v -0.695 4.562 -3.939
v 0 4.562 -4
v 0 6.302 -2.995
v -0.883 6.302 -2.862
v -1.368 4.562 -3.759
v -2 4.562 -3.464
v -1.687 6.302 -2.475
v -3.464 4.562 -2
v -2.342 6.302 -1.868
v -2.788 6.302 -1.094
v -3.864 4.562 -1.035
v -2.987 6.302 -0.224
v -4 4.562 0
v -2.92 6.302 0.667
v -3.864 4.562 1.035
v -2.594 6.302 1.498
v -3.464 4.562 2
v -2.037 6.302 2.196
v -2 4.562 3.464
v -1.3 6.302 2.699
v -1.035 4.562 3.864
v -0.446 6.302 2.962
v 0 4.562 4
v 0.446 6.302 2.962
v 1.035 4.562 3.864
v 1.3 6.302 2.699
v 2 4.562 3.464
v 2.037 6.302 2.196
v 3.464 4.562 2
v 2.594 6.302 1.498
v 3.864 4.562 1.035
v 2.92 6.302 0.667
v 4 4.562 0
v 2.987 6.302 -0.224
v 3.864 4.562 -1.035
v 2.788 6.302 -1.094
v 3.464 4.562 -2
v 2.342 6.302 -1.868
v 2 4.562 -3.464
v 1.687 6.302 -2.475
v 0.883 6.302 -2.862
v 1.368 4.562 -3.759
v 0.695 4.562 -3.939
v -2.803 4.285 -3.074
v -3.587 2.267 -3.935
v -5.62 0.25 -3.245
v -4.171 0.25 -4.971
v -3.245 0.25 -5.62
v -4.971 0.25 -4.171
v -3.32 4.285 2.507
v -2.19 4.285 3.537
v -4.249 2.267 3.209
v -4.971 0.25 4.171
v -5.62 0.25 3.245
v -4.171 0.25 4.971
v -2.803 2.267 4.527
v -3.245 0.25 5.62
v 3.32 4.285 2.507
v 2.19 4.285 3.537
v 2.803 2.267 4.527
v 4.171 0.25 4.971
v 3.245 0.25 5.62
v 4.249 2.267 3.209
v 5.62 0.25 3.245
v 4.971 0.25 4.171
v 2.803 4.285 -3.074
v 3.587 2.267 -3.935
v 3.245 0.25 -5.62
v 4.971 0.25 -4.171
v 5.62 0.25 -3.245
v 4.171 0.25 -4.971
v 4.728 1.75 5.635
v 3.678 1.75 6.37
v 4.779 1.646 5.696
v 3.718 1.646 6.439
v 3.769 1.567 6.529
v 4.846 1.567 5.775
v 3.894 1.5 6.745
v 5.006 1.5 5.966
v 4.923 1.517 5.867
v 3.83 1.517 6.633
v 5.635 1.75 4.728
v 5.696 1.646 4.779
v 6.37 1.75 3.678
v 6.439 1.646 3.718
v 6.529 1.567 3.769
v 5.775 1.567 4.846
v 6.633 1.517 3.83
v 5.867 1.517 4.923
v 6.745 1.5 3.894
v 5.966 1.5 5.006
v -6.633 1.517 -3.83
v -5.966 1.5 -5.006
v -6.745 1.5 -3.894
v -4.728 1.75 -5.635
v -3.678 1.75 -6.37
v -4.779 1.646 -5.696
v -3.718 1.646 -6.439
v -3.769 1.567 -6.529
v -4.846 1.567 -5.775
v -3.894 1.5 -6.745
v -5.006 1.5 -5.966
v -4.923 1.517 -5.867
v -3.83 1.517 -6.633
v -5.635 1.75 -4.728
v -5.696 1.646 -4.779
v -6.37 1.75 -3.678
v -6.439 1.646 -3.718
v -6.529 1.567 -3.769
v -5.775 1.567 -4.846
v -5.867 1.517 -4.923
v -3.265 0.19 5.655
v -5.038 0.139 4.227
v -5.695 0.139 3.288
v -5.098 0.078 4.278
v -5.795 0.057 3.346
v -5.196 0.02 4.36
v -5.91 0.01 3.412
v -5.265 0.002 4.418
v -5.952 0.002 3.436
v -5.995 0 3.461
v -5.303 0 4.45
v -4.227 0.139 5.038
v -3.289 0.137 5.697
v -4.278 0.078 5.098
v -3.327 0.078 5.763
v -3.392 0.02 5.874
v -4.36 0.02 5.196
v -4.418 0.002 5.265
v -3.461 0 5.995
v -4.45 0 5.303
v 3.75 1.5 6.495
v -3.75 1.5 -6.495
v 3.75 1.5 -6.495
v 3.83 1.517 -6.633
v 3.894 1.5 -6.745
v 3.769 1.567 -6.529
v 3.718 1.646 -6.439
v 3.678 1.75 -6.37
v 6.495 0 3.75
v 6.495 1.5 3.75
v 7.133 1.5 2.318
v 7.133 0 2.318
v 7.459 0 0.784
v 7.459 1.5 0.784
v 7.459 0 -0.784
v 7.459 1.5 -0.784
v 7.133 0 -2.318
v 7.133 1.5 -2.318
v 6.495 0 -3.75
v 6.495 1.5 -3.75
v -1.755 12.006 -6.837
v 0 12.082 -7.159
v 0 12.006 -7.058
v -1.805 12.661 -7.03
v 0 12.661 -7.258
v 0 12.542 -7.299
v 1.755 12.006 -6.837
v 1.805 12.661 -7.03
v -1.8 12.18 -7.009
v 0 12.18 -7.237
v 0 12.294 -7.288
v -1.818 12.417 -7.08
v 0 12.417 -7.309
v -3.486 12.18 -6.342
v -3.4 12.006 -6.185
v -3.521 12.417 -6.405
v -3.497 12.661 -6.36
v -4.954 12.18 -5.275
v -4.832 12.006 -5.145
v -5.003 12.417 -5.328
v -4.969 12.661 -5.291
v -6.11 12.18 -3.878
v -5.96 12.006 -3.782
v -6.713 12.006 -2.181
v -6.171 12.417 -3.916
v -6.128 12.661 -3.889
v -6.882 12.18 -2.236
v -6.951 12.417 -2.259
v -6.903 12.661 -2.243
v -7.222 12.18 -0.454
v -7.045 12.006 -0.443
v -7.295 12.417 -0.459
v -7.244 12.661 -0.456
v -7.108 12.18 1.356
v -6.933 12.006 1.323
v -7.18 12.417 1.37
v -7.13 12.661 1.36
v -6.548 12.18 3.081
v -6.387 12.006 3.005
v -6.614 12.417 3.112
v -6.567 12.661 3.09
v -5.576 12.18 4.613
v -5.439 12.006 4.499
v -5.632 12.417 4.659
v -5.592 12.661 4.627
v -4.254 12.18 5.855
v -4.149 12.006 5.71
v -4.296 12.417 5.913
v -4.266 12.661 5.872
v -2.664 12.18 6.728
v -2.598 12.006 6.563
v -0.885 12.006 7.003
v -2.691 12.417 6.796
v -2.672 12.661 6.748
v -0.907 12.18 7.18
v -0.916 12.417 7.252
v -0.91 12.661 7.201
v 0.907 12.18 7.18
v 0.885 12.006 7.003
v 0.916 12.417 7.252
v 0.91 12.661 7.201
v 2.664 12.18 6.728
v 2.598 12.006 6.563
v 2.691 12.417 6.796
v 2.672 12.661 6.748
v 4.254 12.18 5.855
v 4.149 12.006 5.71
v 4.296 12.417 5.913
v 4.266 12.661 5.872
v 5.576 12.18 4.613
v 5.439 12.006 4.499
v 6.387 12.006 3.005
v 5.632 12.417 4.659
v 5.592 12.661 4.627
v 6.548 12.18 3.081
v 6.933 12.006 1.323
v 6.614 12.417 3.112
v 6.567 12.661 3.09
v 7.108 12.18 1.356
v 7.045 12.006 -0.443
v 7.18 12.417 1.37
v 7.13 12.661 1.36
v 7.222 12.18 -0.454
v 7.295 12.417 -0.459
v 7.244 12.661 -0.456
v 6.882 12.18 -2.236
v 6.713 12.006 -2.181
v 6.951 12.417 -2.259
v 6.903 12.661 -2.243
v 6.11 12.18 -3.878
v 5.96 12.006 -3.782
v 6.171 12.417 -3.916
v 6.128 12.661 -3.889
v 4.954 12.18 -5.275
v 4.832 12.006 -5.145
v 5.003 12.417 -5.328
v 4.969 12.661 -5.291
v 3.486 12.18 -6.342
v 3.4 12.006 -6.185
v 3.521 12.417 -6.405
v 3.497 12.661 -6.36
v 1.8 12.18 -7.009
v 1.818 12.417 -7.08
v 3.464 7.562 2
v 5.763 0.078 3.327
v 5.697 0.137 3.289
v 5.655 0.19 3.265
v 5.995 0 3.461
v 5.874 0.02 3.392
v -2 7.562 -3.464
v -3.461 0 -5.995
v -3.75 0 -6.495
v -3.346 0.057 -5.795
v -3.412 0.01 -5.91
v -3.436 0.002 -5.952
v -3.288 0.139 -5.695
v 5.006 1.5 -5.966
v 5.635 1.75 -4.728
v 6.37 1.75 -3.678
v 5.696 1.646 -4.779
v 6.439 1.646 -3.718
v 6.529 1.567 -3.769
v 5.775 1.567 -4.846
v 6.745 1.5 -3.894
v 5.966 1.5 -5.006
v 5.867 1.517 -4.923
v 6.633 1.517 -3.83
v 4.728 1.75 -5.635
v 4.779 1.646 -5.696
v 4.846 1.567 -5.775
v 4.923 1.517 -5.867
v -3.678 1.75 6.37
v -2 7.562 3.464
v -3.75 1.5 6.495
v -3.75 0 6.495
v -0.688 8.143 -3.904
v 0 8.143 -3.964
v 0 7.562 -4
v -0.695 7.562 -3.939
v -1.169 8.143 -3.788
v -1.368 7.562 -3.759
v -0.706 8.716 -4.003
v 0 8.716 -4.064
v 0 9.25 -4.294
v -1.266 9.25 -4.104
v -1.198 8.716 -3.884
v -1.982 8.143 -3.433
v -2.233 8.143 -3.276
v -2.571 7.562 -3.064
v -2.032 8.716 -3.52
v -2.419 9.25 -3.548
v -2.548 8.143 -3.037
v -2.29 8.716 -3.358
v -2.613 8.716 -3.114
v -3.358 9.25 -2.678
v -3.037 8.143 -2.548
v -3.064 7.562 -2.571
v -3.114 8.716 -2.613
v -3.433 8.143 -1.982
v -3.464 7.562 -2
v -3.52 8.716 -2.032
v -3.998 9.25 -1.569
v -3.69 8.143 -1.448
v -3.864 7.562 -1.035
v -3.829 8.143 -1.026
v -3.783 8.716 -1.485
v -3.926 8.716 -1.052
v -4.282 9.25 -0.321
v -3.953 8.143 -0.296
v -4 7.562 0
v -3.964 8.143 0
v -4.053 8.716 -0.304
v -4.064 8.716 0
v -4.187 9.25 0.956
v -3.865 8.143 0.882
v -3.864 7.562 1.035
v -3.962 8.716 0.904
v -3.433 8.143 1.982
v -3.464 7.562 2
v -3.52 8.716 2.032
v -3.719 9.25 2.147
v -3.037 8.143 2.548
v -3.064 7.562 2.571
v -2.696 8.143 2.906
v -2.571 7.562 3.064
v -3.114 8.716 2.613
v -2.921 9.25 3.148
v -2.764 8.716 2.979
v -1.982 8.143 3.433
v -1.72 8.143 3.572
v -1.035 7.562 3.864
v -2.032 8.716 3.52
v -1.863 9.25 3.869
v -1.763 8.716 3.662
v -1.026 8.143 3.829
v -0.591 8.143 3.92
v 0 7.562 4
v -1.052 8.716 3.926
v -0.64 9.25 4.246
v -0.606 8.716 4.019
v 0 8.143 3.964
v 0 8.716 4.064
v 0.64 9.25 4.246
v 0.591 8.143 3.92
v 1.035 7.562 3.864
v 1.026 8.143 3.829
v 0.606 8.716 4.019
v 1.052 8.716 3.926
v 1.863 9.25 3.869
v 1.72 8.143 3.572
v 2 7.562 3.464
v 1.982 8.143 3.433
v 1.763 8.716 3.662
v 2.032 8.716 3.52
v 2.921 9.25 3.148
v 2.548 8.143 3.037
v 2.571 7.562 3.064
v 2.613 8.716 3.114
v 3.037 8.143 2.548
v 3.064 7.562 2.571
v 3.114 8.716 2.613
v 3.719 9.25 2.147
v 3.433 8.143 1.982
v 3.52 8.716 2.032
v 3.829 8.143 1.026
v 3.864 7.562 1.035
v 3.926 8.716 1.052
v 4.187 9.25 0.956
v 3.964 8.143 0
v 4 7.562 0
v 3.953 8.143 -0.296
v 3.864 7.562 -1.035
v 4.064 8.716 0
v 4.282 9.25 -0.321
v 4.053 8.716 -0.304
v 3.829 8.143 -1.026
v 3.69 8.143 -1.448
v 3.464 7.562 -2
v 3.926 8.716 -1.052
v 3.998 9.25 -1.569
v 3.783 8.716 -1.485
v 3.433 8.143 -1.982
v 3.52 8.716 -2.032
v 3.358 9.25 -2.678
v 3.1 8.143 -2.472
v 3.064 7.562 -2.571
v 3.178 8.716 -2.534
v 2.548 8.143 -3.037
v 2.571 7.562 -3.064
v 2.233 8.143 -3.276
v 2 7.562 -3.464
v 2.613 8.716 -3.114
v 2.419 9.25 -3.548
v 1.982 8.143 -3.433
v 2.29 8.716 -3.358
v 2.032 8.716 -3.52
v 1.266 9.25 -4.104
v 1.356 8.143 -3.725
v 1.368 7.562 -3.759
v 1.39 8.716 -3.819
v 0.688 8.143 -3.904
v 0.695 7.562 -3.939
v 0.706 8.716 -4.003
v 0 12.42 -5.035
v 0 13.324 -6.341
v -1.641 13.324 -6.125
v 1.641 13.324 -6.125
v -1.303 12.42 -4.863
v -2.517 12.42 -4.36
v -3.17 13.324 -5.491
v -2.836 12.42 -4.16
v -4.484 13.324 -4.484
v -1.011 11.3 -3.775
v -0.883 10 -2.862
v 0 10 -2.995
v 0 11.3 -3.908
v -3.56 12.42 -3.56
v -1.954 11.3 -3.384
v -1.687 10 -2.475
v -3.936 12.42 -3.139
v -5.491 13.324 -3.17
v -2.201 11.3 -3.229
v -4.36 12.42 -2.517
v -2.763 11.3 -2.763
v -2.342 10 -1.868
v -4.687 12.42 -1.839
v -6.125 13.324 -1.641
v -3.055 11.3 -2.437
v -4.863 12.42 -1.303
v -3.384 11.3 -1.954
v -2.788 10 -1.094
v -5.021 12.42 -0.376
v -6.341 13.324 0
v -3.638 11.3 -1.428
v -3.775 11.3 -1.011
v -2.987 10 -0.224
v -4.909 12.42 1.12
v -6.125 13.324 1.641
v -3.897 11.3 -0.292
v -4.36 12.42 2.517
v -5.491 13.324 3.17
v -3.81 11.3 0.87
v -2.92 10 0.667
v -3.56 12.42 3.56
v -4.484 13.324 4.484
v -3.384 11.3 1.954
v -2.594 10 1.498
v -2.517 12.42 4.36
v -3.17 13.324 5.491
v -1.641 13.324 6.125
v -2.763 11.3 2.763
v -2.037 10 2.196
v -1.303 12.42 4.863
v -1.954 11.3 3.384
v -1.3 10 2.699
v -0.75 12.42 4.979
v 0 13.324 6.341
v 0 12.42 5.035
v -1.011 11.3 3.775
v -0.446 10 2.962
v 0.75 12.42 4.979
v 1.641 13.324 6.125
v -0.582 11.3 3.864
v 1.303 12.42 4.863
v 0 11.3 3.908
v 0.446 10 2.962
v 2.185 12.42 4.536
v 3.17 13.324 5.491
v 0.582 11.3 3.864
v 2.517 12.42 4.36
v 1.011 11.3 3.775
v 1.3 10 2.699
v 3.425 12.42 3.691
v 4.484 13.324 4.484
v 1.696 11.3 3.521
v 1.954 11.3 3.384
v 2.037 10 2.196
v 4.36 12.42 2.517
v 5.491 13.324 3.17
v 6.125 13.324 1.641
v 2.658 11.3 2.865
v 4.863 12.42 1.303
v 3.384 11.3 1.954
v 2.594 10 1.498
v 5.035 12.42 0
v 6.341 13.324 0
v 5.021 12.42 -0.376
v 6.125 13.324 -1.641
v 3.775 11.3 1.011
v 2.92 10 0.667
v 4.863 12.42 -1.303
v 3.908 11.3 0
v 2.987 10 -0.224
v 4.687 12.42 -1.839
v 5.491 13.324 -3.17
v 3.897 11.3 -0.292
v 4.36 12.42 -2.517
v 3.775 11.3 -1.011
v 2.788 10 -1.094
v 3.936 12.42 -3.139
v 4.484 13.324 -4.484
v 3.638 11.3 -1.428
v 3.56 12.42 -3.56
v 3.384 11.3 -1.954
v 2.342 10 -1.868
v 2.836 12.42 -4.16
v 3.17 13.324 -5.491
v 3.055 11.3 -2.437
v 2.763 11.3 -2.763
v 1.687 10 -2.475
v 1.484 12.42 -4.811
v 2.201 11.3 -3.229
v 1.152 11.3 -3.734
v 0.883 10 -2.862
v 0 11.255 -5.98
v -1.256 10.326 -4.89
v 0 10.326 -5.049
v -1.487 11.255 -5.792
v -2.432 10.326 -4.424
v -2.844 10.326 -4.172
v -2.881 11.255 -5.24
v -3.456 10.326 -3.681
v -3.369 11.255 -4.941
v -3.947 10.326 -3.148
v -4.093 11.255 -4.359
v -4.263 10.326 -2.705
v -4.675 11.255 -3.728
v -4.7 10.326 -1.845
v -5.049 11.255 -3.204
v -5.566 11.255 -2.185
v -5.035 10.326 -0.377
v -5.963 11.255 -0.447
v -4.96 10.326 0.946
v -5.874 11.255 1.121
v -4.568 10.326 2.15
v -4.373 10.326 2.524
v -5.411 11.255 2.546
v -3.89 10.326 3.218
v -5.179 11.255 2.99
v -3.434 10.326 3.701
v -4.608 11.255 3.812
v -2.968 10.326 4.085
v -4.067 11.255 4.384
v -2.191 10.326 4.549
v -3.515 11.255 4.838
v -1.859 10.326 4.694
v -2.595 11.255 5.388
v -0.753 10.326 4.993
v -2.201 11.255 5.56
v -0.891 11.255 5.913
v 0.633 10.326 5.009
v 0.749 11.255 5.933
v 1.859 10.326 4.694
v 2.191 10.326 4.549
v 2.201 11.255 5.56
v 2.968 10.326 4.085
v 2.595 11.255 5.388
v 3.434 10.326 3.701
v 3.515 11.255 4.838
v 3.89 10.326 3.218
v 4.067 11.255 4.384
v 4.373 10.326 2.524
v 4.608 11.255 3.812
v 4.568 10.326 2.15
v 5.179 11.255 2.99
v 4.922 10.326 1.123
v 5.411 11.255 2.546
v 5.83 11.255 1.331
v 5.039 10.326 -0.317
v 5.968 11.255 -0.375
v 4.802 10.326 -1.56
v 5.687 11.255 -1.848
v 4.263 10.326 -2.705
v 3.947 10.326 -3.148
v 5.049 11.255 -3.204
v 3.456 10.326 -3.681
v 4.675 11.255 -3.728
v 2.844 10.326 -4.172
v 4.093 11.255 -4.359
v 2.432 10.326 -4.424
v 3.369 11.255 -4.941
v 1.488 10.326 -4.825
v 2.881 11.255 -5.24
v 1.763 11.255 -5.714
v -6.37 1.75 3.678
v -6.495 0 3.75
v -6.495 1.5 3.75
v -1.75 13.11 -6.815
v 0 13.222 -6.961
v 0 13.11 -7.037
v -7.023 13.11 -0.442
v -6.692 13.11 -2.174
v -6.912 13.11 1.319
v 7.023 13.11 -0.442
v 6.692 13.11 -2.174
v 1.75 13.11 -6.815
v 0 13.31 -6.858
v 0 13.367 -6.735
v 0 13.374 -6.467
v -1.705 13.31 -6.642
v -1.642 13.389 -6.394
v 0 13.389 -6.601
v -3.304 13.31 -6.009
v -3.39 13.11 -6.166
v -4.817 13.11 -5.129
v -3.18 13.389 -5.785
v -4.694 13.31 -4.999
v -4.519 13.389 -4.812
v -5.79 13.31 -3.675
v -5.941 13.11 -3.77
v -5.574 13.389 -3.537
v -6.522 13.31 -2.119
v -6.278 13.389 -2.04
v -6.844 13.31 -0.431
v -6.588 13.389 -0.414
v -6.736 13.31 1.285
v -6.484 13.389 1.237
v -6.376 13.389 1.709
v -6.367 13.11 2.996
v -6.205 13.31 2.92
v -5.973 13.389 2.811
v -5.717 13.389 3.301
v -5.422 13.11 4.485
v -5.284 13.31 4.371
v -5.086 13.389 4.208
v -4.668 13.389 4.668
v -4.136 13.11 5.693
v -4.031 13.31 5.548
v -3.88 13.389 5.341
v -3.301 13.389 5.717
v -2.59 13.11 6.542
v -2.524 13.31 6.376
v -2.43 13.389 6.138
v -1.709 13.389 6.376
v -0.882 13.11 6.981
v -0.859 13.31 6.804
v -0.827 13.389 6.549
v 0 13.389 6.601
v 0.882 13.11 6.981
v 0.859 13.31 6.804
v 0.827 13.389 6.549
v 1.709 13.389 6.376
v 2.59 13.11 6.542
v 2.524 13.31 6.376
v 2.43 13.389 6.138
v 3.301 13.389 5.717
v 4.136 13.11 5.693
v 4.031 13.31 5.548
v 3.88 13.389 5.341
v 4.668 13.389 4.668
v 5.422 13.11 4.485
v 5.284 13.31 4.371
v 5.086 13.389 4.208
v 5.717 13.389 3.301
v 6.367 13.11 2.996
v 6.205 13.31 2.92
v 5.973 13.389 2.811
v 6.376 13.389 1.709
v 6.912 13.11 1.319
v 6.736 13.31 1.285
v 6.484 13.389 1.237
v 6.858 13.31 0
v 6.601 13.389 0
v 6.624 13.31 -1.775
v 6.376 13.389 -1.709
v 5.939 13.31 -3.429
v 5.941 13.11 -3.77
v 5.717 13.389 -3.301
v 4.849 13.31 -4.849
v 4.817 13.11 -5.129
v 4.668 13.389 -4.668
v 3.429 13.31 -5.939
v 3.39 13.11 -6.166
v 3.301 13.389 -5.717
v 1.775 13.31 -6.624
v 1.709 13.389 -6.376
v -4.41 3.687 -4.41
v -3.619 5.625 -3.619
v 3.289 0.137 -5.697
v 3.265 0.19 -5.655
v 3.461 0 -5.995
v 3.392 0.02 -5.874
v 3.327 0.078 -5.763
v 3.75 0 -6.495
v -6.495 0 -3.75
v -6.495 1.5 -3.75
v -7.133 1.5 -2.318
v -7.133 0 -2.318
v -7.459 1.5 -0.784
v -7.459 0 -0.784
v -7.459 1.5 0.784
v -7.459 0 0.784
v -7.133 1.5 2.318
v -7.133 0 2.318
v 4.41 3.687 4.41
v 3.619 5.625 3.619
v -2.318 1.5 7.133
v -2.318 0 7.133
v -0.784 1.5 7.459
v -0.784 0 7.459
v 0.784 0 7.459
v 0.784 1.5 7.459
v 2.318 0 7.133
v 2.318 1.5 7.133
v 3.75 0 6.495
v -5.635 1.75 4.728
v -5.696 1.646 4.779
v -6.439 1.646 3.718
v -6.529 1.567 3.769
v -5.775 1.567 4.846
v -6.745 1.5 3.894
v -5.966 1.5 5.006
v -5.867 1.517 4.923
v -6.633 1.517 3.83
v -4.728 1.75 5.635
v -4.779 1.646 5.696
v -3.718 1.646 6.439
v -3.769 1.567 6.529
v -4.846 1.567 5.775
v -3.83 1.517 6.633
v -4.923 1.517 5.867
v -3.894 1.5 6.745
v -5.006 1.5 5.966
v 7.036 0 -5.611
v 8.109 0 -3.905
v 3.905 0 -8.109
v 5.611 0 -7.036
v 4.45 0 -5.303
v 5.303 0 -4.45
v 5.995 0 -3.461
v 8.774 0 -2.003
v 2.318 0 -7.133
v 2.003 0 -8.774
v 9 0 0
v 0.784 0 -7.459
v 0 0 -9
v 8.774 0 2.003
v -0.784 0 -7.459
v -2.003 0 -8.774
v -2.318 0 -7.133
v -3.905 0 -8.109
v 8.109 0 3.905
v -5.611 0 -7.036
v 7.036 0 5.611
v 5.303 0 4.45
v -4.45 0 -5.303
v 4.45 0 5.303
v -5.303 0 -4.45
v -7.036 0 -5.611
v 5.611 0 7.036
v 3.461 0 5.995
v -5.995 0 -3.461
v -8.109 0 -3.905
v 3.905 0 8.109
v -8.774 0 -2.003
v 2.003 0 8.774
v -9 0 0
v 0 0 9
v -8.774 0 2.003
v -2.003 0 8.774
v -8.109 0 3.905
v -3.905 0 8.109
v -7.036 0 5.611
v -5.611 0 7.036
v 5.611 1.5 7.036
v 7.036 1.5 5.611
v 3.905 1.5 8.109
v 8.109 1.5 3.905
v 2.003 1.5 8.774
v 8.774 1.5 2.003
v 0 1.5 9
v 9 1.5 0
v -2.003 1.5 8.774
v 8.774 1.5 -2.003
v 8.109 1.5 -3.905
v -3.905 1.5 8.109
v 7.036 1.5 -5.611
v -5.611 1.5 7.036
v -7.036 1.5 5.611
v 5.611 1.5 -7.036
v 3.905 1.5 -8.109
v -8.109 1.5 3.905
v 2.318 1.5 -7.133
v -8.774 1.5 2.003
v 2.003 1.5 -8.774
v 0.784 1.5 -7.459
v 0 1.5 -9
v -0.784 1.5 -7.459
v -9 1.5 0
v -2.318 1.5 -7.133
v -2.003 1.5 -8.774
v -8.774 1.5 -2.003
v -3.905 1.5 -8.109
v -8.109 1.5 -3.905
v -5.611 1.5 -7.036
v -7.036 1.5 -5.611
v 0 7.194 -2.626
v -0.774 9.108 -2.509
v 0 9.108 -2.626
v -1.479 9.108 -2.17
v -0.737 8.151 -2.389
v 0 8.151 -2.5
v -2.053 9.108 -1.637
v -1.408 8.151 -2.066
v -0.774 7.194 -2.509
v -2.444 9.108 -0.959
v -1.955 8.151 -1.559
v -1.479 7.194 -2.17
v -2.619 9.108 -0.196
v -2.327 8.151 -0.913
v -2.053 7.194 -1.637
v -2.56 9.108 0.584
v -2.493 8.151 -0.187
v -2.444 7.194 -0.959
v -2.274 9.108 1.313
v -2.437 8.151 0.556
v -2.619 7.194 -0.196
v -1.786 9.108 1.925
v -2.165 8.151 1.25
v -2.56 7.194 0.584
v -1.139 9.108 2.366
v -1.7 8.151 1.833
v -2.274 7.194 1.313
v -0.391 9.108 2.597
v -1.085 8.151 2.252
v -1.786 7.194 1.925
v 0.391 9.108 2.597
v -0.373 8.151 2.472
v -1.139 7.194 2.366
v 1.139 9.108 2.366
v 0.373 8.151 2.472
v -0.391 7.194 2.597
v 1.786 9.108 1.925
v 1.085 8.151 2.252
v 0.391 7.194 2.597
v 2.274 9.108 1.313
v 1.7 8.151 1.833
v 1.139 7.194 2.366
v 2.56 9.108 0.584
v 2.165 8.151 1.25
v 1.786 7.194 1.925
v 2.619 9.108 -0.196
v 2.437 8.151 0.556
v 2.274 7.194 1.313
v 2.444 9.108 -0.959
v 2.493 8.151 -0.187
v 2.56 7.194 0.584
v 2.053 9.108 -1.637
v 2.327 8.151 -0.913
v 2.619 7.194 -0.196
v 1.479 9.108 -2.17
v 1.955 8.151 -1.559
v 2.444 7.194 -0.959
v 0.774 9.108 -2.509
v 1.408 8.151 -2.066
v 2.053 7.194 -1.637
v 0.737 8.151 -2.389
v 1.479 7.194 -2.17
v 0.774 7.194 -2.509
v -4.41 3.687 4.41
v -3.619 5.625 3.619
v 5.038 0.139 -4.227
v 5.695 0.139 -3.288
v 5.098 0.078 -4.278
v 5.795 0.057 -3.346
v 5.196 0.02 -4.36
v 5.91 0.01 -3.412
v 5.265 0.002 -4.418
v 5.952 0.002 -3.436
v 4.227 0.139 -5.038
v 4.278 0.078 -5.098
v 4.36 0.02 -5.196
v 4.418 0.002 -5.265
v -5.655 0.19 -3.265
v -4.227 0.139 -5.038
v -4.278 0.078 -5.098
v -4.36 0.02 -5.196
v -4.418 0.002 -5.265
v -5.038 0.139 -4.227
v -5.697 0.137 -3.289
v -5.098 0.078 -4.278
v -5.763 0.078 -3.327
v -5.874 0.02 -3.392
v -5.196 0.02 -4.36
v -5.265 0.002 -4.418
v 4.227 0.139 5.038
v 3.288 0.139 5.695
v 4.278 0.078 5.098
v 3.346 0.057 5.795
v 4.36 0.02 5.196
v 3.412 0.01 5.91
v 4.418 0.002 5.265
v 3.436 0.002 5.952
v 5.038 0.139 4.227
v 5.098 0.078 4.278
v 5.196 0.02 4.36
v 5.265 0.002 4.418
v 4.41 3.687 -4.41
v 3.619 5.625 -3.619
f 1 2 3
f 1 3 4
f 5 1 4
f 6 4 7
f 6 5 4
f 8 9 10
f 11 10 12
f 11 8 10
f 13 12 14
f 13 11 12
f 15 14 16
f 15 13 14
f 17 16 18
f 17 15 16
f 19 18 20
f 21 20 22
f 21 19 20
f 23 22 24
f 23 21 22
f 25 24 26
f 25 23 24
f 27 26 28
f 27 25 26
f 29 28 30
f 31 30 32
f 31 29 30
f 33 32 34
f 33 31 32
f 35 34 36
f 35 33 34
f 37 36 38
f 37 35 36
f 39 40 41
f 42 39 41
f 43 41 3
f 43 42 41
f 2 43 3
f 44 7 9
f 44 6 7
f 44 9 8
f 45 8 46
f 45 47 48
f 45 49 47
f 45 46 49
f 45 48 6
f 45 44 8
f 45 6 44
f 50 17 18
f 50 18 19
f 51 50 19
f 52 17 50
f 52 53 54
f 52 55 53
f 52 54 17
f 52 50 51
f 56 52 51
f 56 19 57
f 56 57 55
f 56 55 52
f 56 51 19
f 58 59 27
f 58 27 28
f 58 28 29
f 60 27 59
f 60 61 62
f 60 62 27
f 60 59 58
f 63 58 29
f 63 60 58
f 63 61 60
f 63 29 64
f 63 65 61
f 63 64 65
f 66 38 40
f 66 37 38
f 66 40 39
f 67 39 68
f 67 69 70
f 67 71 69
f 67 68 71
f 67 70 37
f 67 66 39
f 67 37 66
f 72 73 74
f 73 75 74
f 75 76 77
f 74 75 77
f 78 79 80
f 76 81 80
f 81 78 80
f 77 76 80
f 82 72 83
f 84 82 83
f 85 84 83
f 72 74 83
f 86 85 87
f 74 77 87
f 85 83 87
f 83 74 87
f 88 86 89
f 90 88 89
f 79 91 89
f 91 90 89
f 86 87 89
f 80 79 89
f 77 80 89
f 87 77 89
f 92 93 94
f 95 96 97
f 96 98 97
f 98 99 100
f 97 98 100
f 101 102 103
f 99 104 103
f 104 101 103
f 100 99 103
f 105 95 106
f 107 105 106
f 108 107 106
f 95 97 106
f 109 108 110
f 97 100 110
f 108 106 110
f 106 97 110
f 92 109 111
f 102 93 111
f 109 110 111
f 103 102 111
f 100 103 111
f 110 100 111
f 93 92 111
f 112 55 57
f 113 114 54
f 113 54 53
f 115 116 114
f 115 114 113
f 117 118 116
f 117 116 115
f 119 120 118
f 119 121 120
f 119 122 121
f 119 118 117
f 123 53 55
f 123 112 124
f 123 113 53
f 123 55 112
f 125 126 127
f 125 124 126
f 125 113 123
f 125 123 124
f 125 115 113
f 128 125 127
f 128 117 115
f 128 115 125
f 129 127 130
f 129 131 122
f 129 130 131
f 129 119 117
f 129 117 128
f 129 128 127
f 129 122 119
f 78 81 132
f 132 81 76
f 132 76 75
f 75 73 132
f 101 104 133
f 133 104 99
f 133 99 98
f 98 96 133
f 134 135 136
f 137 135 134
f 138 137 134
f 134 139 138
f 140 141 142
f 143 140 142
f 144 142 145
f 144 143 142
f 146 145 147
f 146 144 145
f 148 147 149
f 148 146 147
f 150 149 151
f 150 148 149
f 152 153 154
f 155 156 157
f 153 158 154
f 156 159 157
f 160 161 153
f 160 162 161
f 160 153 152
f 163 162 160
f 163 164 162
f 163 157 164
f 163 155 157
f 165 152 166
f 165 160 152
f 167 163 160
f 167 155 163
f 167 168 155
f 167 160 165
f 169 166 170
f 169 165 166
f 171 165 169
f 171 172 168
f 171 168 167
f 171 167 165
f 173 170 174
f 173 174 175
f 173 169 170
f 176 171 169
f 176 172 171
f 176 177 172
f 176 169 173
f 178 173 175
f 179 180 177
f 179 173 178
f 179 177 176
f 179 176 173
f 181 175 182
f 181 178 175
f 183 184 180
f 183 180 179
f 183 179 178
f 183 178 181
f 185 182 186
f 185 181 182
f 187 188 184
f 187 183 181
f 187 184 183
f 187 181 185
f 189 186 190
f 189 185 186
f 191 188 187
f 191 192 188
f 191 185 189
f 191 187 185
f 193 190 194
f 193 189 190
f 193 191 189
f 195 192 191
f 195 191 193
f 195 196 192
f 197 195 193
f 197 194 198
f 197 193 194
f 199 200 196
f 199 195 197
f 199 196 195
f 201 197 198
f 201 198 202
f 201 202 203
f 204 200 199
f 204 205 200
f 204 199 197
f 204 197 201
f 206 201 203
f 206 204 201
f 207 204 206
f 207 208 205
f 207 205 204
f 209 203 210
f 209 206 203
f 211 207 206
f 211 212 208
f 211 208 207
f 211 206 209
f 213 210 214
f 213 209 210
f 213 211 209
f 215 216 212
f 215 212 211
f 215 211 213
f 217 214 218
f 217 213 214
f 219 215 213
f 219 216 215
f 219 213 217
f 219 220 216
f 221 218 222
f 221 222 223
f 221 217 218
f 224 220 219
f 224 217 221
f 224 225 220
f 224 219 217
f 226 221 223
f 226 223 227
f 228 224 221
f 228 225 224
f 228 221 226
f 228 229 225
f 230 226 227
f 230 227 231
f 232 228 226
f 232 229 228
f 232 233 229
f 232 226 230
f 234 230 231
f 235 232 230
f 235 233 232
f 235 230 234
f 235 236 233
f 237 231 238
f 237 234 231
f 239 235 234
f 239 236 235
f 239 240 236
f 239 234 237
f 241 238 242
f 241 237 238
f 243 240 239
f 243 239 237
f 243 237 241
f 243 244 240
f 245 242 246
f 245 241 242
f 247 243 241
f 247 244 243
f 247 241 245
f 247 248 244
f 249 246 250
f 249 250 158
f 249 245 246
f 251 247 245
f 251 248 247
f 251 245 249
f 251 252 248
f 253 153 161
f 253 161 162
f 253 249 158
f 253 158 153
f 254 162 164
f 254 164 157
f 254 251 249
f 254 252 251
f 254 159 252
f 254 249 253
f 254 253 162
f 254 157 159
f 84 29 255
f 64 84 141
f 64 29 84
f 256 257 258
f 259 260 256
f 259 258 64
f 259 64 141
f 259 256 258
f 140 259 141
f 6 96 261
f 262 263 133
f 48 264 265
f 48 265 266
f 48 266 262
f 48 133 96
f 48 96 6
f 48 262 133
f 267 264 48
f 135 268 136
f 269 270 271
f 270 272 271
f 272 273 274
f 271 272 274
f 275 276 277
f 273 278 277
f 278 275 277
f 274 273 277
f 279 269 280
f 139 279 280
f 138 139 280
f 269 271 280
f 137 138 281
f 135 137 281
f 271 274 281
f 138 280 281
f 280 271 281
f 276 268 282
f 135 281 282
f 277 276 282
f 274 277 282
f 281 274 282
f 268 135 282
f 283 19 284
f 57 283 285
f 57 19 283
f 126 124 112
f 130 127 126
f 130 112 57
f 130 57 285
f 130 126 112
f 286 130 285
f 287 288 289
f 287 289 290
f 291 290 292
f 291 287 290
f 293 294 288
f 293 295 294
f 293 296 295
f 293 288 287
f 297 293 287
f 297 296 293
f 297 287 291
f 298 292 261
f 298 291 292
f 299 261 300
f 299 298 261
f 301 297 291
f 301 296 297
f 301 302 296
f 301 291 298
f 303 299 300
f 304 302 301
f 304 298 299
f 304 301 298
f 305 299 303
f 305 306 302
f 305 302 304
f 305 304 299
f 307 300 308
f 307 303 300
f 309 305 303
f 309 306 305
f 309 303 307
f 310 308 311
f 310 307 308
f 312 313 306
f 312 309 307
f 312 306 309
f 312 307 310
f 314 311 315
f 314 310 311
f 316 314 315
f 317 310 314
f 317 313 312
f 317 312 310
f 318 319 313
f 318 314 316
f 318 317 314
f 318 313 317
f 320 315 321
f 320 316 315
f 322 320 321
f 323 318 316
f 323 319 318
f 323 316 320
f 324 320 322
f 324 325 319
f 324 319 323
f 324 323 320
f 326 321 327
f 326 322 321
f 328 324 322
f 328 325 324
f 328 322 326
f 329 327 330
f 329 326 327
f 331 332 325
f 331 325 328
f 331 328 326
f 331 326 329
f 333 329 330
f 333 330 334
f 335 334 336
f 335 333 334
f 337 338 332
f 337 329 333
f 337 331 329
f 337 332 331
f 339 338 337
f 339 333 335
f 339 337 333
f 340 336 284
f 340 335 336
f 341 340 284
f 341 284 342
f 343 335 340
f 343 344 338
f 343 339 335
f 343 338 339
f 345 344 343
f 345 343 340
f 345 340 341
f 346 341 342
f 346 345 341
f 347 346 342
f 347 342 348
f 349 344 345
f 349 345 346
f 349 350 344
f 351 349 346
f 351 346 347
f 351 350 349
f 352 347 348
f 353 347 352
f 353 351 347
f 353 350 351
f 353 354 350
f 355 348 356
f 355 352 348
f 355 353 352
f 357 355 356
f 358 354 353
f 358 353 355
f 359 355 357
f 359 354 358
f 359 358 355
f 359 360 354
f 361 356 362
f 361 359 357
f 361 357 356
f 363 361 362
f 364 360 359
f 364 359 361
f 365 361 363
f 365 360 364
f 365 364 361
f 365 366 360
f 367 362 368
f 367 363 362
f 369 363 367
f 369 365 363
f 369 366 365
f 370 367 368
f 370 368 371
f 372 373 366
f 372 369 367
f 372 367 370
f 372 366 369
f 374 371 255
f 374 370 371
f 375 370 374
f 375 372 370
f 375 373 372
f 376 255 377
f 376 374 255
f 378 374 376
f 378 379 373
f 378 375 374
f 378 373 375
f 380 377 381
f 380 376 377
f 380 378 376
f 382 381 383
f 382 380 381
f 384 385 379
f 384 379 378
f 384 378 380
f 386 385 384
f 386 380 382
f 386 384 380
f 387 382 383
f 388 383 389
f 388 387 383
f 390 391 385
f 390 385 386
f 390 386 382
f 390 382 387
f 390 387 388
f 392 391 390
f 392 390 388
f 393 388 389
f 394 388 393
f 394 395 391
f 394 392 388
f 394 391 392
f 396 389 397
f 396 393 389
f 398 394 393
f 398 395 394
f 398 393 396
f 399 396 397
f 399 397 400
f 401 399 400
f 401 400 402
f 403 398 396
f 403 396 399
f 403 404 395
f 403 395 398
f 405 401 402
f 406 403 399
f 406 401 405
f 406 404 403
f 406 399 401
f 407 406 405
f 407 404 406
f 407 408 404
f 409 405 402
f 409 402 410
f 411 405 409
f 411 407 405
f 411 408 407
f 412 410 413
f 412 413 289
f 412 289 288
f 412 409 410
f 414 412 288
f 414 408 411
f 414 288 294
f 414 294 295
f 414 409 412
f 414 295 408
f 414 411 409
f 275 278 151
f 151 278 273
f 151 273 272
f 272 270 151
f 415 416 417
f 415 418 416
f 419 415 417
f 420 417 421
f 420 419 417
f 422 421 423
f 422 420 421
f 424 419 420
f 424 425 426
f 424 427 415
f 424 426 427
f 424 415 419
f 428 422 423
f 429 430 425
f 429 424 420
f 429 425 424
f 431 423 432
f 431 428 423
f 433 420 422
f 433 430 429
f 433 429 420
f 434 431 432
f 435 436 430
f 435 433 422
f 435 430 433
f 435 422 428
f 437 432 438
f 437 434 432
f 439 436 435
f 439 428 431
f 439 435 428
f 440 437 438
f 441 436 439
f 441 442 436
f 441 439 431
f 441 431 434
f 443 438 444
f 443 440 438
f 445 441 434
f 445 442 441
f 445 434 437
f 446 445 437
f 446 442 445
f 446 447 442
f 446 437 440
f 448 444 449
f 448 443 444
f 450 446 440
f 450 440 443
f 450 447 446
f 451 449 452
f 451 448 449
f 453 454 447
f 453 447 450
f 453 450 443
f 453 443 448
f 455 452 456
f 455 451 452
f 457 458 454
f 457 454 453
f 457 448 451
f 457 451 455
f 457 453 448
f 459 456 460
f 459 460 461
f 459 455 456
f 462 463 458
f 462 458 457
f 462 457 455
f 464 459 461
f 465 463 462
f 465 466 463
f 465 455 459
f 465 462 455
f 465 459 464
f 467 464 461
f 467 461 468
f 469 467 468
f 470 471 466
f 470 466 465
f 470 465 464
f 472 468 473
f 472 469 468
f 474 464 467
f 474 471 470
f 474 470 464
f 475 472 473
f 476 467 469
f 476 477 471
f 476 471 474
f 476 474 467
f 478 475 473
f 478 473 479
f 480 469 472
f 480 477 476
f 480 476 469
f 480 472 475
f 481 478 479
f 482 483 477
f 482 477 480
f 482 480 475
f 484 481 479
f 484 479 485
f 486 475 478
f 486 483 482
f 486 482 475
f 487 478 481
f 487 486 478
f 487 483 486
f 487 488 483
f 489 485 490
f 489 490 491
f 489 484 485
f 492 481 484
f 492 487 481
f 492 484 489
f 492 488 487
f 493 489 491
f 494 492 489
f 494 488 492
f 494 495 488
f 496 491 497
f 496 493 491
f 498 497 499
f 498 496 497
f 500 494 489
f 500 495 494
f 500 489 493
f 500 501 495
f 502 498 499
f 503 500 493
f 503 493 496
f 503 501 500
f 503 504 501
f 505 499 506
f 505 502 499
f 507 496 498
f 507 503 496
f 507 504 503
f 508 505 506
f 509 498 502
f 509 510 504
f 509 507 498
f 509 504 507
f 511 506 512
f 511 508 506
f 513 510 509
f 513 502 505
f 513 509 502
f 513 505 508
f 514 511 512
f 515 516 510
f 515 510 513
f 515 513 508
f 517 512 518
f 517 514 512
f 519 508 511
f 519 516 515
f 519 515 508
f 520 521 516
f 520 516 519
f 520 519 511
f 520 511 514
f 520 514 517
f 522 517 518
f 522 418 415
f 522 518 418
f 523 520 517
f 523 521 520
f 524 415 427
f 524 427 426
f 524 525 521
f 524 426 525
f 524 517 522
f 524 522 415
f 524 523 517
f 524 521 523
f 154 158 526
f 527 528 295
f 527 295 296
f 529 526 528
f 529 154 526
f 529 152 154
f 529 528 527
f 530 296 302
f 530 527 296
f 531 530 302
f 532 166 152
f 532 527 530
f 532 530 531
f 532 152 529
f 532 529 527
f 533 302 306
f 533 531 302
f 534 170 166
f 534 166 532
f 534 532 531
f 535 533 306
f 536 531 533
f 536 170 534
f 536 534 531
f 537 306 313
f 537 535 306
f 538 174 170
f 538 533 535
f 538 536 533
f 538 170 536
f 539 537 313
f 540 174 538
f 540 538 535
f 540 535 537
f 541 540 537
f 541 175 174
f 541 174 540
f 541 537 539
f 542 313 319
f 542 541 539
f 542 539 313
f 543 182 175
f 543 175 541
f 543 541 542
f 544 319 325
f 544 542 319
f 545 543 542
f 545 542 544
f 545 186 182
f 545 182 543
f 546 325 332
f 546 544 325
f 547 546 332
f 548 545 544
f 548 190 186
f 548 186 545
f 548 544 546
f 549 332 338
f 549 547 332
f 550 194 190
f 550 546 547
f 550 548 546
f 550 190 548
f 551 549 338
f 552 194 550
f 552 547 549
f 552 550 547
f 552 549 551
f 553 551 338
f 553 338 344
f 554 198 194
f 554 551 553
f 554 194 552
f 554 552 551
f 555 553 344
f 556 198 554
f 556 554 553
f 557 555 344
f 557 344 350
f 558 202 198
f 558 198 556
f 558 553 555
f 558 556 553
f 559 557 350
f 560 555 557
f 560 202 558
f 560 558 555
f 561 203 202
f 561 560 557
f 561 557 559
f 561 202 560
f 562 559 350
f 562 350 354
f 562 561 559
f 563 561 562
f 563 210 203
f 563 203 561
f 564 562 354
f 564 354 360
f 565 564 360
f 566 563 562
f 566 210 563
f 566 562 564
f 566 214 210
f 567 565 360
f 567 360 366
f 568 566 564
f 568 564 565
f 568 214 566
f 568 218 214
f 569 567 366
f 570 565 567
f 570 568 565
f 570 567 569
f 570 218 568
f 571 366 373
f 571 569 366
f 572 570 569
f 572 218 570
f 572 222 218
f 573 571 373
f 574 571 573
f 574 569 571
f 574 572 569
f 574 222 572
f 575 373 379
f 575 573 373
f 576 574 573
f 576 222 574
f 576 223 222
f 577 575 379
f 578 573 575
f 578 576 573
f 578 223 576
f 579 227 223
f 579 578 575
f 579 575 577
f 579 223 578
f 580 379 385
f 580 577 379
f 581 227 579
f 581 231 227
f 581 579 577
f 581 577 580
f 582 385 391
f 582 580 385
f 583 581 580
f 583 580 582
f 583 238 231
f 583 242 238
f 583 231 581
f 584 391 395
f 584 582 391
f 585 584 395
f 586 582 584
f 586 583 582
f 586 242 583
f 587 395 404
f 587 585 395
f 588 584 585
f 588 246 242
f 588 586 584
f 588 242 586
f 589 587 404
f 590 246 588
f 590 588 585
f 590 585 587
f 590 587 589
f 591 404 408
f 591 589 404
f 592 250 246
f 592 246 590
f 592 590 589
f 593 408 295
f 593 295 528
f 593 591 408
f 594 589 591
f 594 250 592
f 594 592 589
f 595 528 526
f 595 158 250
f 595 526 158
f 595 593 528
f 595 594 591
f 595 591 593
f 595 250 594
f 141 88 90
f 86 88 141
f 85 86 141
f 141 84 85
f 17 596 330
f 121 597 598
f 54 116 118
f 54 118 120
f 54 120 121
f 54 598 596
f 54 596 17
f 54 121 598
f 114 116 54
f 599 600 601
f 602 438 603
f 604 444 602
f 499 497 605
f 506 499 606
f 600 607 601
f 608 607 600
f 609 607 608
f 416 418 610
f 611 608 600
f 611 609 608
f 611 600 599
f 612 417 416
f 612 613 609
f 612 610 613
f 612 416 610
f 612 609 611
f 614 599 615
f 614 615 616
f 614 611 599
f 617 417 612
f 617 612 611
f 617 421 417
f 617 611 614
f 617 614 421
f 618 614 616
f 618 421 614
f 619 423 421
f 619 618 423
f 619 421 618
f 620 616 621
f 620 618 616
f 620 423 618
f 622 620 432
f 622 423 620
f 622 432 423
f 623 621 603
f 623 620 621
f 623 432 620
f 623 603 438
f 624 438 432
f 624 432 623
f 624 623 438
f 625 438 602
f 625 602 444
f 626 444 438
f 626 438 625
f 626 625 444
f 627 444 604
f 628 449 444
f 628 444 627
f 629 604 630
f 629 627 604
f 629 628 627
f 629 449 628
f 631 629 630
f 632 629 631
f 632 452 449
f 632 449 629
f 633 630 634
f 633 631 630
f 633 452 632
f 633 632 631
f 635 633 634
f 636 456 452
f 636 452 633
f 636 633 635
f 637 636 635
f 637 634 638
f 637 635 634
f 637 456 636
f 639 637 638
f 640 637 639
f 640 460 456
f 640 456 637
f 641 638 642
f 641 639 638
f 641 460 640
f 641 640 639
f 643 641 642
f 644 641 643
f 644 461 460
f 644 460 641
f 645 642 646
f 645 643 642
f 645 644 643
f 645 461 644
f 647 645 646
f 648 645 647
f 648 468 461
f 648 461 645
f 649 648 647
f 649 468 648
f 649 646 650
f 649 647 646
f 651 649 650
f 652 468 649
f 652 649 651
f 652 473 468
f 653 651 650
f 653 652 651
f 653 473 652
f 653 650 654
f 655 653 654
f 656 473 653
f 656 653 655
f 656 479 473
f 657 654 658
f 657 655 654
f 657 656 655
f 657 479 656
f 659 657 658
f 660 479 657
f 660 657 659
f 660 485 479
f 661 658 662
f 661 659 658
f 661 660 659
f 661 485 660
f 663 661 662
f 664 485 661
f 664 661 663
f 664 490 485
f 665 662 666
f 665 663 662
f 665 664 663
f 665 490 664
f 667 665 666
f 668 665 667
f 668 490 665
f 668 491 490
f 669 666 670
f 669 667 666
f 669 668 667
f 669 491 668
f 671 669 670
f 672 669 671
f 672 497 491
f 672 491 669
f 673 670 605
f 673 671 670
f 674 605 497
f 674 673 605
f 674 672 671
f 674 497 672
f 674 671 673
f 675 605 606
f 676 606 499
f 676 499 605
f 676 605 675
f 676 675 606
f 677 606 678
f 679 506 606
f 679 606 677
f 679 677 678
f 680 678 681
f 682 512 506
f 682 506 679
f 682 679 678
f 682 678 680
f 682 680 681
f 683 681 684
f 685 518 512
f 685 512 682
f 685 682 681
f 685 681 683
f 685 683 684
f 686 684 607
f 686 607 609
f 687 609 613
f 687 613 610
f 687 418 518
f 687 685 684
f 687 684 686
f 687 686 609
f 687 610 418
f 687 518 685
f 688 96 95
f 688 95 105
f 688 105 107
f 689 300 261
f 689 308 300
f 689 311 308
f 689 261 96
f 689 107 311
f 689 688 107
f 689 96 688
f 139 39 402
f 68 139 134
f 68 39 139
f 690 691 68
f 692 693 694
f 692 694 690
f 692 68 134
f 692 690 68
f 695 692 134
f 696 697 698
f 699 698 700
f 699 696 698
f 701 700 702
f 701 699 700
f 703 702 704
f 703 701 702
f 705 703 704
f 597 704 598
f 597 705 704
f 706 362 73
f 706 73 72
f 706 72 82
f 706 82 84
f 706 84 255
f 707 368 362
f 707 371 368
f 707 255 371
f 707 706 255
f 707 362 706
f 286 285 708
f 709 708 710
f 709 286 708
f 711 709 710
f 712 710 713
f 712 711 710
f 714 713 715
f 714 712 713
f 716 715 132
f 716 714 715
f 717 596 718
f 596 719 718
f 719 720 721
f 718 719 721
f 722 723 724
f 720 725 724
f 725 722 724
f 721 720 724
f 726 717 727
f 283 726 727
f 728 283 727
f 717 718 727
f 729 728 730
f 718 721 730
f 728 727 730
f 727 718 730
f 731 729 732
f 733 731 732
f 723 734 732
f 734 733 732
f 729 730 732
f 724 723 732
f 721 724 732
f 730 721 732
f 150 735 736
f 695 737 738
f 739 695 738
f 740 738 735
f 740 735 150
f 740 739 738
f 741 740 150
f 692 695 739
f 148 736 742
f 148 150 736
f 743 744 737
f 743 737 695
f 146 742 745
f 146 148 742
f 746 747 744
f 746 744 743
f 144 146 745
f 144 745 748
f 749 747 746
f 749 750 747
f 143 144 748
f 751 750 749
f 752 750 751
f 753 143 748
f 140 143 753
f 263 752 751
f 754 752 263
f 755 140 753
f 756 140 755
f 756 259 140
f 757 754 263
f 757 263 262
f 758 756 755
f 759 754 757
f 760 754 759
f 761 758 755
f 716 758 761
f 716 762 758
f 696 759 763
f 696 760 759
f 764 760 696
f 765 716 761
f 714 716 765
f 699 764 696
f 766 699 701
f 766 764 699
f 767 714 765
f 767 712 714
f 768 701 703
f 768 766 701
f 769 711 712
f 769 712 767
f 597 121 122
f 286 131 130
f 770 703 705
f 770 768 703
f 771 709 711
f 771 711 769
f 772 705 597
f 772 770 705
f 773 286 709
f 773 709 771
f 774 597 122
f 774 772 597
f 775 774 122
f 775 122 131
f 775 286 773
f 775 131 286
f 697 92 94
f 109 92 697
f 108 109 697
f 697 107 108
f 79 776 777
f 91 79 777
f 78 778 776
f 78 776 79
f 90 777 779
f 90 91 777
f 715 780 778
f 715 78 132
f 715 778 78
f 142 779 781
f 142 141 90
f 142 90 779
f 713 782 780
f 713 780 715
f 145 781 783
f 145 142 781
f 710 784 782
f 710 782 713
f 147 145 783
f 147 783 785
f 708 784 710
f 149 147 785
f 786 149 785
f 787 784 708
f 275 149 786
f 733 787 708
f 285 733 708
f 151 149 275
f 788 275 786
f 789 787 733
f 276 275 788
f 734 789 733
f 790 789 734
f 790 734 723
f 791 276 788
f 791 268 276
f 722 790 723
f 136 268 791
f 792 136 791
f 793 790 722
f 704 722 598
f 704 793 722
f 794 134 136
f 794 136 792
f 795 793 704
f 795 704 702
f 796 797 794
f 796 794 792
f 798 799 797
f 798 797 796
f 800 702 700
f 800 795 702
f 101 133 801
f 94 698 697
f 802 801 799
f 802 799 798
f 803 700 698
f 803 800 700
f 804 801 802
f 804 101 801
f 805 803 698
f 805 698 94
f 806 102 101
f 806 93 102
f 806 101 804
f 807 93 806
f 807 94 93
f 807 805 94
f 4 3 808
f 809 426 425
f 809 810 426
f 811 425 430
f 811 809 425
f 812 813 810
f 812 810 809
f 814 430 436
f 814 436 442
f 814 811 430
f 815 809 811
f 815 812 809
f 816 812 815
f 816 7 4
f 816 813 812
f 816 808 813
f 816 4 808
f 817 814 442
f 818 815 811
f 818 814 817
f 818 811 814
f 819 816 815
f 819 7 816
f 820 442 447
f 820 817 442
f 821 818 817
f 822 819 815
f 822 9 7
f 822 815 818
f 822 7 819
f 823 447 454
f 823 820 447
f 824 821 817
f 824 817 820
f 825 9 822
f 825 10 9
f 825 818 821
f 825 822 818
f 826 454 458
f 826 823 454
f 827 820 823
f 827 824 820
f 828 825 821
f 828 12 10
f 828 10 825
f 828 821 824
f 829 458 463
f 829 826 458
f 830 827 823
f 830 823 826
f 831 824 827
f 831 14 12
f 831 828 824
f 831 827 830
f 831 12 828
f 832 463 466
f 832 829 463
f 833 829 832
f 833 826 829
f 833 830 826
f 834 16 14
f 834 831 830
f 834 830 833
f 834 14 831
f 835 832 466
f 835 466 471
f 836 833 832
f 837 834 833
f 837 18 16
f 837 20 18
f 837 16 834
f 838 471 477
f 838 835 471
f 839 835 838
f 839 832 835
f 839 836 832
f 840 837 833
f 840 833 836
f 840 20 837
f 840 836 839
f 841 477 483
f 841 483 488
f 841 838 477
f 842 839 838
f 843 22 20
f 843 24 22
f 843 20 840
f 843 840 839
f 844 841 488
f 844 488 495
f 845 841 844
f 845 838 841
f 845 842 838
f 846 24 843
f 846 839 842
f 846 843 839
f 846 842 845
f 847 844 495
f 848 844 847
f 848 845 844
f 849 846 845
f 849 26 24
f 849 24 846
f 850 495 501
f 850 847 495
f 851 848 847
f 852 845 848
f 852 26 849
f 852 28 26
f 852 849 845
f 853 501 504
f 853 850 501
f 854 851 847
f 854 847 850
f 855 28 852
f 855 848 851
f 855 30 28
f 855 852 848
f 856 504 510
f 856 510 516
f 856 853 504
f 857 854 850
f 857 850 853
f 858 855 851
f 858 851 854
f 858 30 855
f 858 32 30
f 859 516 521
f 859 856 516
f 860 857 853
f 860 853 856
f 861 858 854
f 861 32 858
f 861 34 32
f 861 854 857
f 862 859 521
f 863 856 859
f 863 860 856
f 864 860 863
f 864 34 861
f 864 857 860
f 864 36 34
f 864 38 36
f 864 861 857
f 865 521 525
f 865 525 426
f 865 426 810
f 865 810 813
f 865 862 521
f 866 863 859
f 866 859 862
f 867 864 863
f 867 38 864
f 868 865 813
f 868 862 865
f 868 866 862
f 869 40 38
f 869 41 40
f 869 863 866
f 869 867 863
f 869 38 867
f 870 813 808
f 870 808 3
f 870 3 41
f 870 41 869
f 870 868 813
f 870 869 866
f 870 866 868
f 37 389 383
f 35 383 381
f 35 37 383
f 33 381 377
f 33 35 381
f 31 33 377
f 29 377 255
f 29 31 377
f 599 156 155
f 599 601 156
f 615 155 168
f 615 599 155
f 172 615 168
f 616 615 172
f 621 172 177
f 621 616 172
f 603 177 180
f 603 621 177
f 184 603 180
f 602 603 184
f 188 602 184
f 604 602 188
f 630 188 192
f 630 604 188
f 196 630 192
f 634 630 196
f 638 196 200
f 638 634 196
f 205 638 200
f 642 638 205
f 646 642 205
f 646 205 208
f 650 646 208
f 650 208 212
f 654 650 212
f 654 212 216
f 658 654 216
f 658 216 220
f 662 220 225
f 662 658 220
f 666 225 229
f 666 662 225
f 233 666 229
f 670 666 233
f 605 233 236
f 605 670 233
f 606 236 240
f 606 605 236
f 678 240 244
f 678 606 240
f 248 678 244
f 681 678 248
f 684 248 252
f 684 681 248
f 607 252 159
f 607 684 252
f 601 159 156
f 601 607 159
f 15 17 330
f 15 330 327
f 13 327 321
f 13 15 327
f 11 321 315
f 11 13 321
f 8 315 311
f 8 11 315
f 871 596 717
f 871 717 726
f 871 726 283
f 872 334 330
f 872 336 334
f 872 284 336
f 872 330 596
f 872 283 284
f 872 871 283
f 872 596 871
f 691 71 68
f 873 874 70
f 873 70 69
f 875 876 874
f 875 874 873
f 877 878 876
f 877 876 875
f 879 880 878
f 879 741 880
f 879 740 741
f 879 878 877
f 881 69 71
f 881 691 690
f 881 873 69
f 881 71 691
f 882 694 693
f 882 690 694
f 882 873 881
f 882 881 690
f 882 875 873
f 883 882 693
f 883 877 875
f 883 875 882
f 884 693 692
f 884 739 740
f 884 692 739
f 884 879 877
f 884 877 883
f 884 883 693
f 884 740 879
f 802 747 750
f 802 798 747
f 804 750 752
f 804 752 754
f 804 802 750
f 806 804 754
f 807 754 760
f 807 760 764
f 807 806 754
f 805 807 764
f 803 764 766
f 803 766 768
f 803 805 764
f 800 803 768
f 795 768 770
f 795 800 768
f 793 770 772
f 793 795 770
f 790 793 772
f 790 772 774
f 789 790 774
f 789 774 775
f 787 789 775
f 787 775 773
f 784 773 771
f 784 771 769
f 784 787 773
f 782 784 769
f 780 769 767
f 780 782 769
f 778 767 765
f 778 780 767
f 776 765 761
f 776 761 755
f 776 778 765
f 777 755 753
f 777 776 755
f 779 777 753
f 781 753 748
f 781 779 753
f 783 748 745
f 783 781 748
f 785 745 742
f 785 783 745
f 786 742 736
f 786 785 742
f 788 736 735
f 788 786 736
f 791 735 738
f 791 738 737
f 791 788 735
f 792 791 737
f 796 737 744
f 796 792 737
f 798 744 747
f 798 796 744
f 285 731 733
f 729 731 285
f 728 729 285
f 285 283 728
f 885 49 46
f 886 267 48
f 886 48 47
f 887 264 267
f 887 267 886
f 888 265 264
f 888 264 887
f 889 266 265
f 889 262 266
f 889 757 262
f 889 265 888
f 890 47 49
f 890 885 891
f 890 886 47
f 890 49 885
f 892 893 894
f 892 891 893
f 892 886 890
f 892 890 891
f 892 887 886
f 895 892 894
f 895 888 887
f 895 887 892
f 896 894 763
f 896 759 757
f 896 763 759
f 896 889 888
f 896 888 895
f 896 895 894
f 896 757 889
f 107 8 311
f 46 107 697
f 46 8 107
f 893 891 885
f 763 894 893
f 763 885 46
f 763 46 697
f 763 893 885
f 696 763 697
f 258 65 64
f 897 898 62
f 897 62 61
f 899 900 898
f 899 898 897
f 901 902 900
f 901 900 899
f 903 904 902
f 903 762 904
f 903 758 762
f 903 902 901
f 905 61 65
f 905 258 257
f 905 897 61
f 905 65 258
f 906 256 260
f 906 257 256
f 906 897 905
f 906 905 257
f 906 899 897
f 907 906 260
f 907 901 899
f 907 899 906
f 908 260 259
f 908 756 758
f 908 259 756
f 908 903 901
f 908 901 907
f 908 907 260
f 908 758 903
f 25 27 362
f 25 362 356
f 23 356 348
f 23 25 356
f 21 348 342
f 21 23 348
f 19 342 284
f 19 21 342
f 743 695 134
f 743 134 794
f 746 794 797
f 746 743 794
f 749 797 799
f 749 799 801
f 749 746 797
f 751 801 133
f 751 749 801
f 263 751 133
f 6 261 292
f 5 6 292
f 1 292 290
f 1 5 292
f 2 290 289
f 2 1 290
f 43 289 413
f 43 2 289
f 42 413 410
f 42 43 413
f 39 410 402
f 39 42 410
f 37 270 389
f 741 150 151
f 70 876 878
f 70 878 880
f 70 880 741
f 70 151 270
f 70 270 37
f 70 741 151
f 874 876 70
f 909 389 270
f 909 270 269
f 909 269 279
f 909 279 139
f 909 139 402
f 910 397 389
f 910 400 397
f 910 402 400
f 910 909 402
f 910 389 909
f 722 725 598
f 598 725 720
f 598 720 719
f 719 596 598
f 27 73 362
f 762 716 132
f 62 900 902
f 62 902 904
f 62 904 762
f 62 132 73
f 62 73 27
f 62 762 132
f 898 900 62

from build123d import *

# Parameters (mm, degrees)
CUT_EXTRUDE1_DEPTH = 7.562178
FILLET1_R          = 0.5


with BuildPart() as part:
    # Sketch1 → Revolve1 (revolve)
    with BuildSketch(Plane.XY, mode=Mode.PRIVATE) as revolve1_sk:
        with BuildLine():
            Line((6.633974596215569, -1.2e-16), (8.999999999999998, -4.52e-15))
            Line((8.999999999999998, -4.52e-15), (8.999999999999998, 1.4999999999999956))
            Line((8.999999999999998, 1.4999999999999956), (7.5, 1.5))
            Line((7.5, 1.5), (4, 7.562177826491056))
            ThreePointArc((4, 7.562177826491056), (3.99763327378791, 8.432186632808357), (4.294453456567456, 9.249999999999998))
            ThreePointArc((4.294453456567456, 9.249999999999998), (5.662653405718452, 10.973935293777526), (7.4723600696108665, 12.226487004746774))
            Line((7.4723600696108665, 12.226487004746774), (6.808903286542892, 13.57178440569613))
            ThreePointArc((6.808903286542892, 13.57178440569613), (4.6372552898719945, 12.068722352533033), (2.995415350890799, 10))
            ThreePointArc((2.995415350890799, 10), (2.4999999999999996, 8.15108473962598), (2.995415350890799, 6.302169479251957))
            Line((2.995415350890799, 6.302169479251957), (6.633974596215569, -1.2e-16))
        make_face()
    revolve(revolve1_sk.sketch.rotate(Axis((0, 0, 0), (0, 1, 0)), 90), axis=Axis((0, 0, 0), (0, 1, 0)))

    # Sketch2 → Cut-Extrude1 (cut)
    with BuildSketch(Plane(origin=(0, 0, 0), x_dir=(1, 0, 0), z_dir=(0, 1, 0))):
        with BuildLine():
            Line((-3.749999941549397, 6.495190562129763), (-1.999999941549405, 3.4641016488842244))
            ThreePointArc((-1.999999941549405, 3.4641016488842244), (2.4e-16, 4.0000000000000036), (1.999999941549405, 3.4641016488842244))
            Line((1.999999941549405, 3.4641016488842244), (3.749999941549397, 6.495190562129763))
            ThreePointArc((3.749999941549397, 6.495190562129763), (4.6e-16, 7.500000000000002), (-3.749999941549397, 6.495190562129763))
        make_face()
        with BuildLine():
            Line((6.495190562129763, 3.7499999415493974), (3.4641016488842244, 1.999999941549405))
            ThreePointArc((3.4641016488842244, 1.999999941549405), (4.0000000000000036, 0), (3.4641016488842244, -1.999999941549405))
            Line((3.4641016488842244, -1.999999941549405), (6.495190562129763, -3.7499999415493965))
            ThreePointArc((6.495190562129763, -3.7499999415493965), (7.500000000000002, 0), (6.495190562129763, 3.7499999415493974))
        make_face()
        with BuildLine():
            Line((3.749999941549398, -6.495190562129762), (1.9999999415494054, -3.464101648884224))
            ThreePointArc((1.9999999415494054, -3.464101648884224), (2.4e-16, -4.0000000000000036), (-1.9999999415494045, -3.464101648884225))
            Line((-1.9999999415494045, -3.464101648884225), (-3.749999941549396, -6.495190562129764))
            ThreePointArc((-3.749999941549396, -6.495190562129764), (2.12e-15, -7.500000000000003), (3.749999941549398, -6.495190562129762))
        make_face()
        with BuildLine():
            Line((-6.495190562129762, -3.7499999415493983), (-3.464101648884224, -1.9999999415494054))
            ThreePointArc((-3.464101648884224, -1.9999999415494054), (-4.0000000000000036, 4.9e-16), (-3.464101648884225, 1.9999999415494045))
            Line((-3.464101648884225, 1.9999999415494045), (-6.495190562129764, 3.7499999415493956))
            ThreePointArc((-6.495190562129764, 3.7499999415493956), (-7.500000000000002, -2.41e-15), (-6.495190562129762, -3.7499999415493983))
        make_face()
    extrude(amount=CUT_EXTRUDE1_DEPTH, mode=Mode.SUBTRACT)

    # Fillet1
    # the kernel refuses this fillet: 0.5 mm, written as the material it adds along each edge
    with BuildSketch(Plane(origin=(0, 1.5, 0), x_dir=(0.8660254082839624, 0, -0.49999999220659597), z_dir=(0.49999999220659597, 0, 0.8660254082839624))) as fillet1_piece_1:
        with BuildLine():
            CenterArc((7.499999999999999 + FILLET1_R * 0.57735026919, FILLET1_R), FILLET1_R, 209.99999999999957, 60.000000000000455)
            Line((7.499999999999999 - FILLET1_R * 0.288675134595, FILLET1_R * 0.5), (7.499999999999999, 0))
            Line((7.499999999999999, 0), (7.499999999999999 + FILLET1_R * 0.57735026919, -4.44e-15))
        make_face()
    revolve(axis=Axis((0, 1.5, 0), (0, 1, 0)), revolution_arc=30.000001031215383)
    with BuildSketch(Plane(origin=(0, 1.5, 0), x_dir=(0.4999999922066019, 0, 0.8660254082839591), z_dir=(-0.8660254082839591, 0, 0.4999999922066019))) as fillet1_piece_2:
        with BuildLine():
            CenterArc((7.5 + FILLET1_R * 0.57735026919, FILLET1_R), FILLET1_R, 209.99999999999957, 60.000000000000455)
            Line((7.5 - FILLET1_R * 0.288675134595, FILLET1_R * 0.5), (7.5, 0))
            Line((7.5, 0), (7.5 + FILLET1_R * 0.57735026919, -4.44e-15))
        make_face()
    revolve(axis=Axis((0, 1.5, 0), (0, 1, 0)), revolution_arc=30.000001031214644)
    with BuildSketch(Plane(origin=(0, 1.5, 0), x_dir=(-0.8660254082839636, 0, 0.49999999220659425), z_dir=(-0.49999999220659425, 0, -0.8660254082839636))) as fillet1_piece_3:
        with BuildLine():
            CenterArc((7.5 + FILLET1_R * 0.57735026919, FILLET1_R), FILLET1_R, 209.99999999999963, 60.00000000000034)
            Line((7.5 - FILLET1_R * 0.288675134595, FILLET1_R * 0.5), (7.5, 0))
            Line((7.5, 0), (7.5 + FILLET1_R * 0.57735026919, -4.44e-15))
        make_face()
    revolve(axis=Axis((0, 1.5, 0), (0, 1, 0)), revolution_arc=30.000001031214545)
    with BuildSketch(Plane(origin=(0, 1.5, 0), x_dir=(-0.49999999220658903, 0, -0.8660254082839666), z_dir=(0.8660254082839666, 0, -0.49999999220658903))) as fillet1_piece_4:
        with BuildLine():
            CenterArc((7.499999999999999 + FILLET1_R * 0.57735026919, FILLET1_R), FILLET1_R, 210.00000000000003, 59.99999999999987)
            Line((7.499999999999999 + FILLET1_R * 0.57735026919, 4.4e-16), (7.499999999999999, 0))
            Line((7.499999999999999, 0), (7.499999999999999 - FILLET1_R * 0.288675134595, FILLET1_R * 0.5))
        make_face()
    revolve(axis=Axis((0, 1.5, 0), (0, 1, 0)), revolution_arc=30.00000103121539)
    # the kernel refuses this fillet: 0.5 mm, written as the material it takes off along each edge
    with BuildSketch(Plane(origin=(0, -1.2e-16, 0), x_dir=(0.9151940117210042, 0, -0.40301354928837607), z_dir=(0.40301354928837607, 0, 0.9151940117210042))) as fillet1_2_piece_1:
        with BuildLine():
            CenterArc((6.633974596215569 + FILLET1_R * 0.57735026919, FILLET1_R), FILLET1_R, 210.00000000000003, 59.99999999999987)
            Line((6.633974596215569 + FILLET1_R * 0.57735026919, -1.27e-15), (6.633974596215569, 1.2e-16))
            Line((6.633974596215569, 1.2e-16), (6.633974596215569 - FILLET1_R * 0.288675134595, FILLET1_R * 0.5))
        make_face()
    revolve(axis=Axis((0, -1.2e-16, 0), (0, 1, 0)), revolution_arc=42.466588641203785, mode=Mode.SUBTRACT)
    with BuildSketch(Plane(origin=(0, -1.2e-16, 0), x_dir=(0.40301354928837646, 0, 0.915194011721004), z_dir=(-0.915194011721004, 0, 0.40301354928837646))) as fillet1_2_piece_2:
        with BuildLine():
            CenterArc((6.633974596215568 + FILLET1_R * 0.57735026919, FILLET1_R), FILLET1_R, 210.00000000000006, 59.999999999999844)
            Line((6.633974596215568 + FILLET1_R * 0.57735026919, -3.3e-16), (6.633974596215568, 1.2e-16))
            Line((6.633974596215568, 1.2e-16), (6.633974596215568 - FILLET1_R * 0.288675134595, FILLET1_R * 0.5))
        make_face()
    revolve(axis=Axis((0, -1.2e-16, 0), (0, 1, 0)), revolution_arc=42.466588641203685, mode=Mode.SUBTRACT)
    with BuildSketch(Plane(origin=(0, -1.2e-16, 0), x_dir=(-0.915194011721004, 0, 0.4030135492883765), z_dir=(-0.4030135492883765, 0, -0.915194011721004))) as fillet1_2_piece_3:
        with BuildLine():
            CenterArc((6.633974596215569 + FILLET1_R * 0.57735026919, FILLET1_R), FILLET1_R, 210.0000000000001, 59.999999999999886)
            Line((6.633974596215569 + FILLET1_R * 0.57735026919, -1.21e-15), (6.633974596215569, 1.2e-16))
            Line((6.633974596215569, 1.2e-16), (6.633974596215569 - FILLET1_R * 0.288675134595, FILLET1_R * 0.5))
        make_face()
    revolve(axis=Axis((0, -1.2e-16, 0), (0, 1, 0)), revolution_arc=42.466588641203685, mode=Mode.SUBTRACT)
    with BuildSketch(Plane(origin=(0, -1.2e-16, 0), x_dir=(-0.40301354928837607, 0, -0.9151940117210042), z_dir=(0.9151940117210042, 0, -0.40301354928837607))) as fillet1_2_piece_4:
        with BuildLine():
            CenterArc((6.63397459621557 + FILLET1_R * 0.57735026919, FILLET1_R), FILLET1_R, 210.00000000000006, 59.99999999999994)
            Line((6.63397459621557 + FILLET1_R * 0.57735026919, -1.21e-15), (6.63397459621557, 1.2e-16))
            Line((6.63397459621557, 1.2e-16), (6.63397459621557 - FILLET1_R * 0.288675134595, FILLET1_R * 0.5))
        make_face()
    revolve(axis=Axis((0, -1.2e-16, 0), (0, 1, 0)), revolution_arc=42.46658864120374, mode=Mode.SUBTRACT)
    with BuildSketch(Plane(origin=(0, 13.571784405696132, 0), x_dir=(1.1e-16, 0, -1), z_dir=(1, 0, 1.1e-16))) as fillet1_2_piece_5:
        with BuildLine():
            CenterArc((6.5881331953149616, -0.6827853473273997), FILLET1_R, 26.25101140415418, 93.3722866833914)
            Line((7.036565662297915, -0.46163308630440625), (6.808903286542892, 0))
            ThreePointArc((6.808903286542892, 0), (6.573118661901752, -0.12062636424792572), (6.3409855018069745, -0.2481383438939453))
        make_face()
    revolve(axis=Axis((0, 13.571784405696132, 0), (0, 1, 0)), mode=Mode.SUBTRACT)
    with BuildSketch(Plane(origin=(0, 12.226487004746774, 0), x_dir=(1.1e-16, 0, -1), z_dir=(1, 0, 1.1e-16))) as fillet1_2_piece_6:
        with BuildLine():
            CenterArc((6.809693112007429, 0.21325297950030375), FILLET1_R, 299.8343331025833, 86.41667830167688)
            Line((7.258125578989974, 0.43440524052412677), (7.4723600696108665, 0))
            ThreePointArc((7.4723600696108665, 0), (7.263676285711675, -0.10700426181869638), (7.058440041566387, -0.22048076951513984))
        make_face()
    revolve(axis=Axis((0, 12.226487004746774, 0), (0, 1, 0)), mode=Mode.SUBTRACT)


solid = part.part
